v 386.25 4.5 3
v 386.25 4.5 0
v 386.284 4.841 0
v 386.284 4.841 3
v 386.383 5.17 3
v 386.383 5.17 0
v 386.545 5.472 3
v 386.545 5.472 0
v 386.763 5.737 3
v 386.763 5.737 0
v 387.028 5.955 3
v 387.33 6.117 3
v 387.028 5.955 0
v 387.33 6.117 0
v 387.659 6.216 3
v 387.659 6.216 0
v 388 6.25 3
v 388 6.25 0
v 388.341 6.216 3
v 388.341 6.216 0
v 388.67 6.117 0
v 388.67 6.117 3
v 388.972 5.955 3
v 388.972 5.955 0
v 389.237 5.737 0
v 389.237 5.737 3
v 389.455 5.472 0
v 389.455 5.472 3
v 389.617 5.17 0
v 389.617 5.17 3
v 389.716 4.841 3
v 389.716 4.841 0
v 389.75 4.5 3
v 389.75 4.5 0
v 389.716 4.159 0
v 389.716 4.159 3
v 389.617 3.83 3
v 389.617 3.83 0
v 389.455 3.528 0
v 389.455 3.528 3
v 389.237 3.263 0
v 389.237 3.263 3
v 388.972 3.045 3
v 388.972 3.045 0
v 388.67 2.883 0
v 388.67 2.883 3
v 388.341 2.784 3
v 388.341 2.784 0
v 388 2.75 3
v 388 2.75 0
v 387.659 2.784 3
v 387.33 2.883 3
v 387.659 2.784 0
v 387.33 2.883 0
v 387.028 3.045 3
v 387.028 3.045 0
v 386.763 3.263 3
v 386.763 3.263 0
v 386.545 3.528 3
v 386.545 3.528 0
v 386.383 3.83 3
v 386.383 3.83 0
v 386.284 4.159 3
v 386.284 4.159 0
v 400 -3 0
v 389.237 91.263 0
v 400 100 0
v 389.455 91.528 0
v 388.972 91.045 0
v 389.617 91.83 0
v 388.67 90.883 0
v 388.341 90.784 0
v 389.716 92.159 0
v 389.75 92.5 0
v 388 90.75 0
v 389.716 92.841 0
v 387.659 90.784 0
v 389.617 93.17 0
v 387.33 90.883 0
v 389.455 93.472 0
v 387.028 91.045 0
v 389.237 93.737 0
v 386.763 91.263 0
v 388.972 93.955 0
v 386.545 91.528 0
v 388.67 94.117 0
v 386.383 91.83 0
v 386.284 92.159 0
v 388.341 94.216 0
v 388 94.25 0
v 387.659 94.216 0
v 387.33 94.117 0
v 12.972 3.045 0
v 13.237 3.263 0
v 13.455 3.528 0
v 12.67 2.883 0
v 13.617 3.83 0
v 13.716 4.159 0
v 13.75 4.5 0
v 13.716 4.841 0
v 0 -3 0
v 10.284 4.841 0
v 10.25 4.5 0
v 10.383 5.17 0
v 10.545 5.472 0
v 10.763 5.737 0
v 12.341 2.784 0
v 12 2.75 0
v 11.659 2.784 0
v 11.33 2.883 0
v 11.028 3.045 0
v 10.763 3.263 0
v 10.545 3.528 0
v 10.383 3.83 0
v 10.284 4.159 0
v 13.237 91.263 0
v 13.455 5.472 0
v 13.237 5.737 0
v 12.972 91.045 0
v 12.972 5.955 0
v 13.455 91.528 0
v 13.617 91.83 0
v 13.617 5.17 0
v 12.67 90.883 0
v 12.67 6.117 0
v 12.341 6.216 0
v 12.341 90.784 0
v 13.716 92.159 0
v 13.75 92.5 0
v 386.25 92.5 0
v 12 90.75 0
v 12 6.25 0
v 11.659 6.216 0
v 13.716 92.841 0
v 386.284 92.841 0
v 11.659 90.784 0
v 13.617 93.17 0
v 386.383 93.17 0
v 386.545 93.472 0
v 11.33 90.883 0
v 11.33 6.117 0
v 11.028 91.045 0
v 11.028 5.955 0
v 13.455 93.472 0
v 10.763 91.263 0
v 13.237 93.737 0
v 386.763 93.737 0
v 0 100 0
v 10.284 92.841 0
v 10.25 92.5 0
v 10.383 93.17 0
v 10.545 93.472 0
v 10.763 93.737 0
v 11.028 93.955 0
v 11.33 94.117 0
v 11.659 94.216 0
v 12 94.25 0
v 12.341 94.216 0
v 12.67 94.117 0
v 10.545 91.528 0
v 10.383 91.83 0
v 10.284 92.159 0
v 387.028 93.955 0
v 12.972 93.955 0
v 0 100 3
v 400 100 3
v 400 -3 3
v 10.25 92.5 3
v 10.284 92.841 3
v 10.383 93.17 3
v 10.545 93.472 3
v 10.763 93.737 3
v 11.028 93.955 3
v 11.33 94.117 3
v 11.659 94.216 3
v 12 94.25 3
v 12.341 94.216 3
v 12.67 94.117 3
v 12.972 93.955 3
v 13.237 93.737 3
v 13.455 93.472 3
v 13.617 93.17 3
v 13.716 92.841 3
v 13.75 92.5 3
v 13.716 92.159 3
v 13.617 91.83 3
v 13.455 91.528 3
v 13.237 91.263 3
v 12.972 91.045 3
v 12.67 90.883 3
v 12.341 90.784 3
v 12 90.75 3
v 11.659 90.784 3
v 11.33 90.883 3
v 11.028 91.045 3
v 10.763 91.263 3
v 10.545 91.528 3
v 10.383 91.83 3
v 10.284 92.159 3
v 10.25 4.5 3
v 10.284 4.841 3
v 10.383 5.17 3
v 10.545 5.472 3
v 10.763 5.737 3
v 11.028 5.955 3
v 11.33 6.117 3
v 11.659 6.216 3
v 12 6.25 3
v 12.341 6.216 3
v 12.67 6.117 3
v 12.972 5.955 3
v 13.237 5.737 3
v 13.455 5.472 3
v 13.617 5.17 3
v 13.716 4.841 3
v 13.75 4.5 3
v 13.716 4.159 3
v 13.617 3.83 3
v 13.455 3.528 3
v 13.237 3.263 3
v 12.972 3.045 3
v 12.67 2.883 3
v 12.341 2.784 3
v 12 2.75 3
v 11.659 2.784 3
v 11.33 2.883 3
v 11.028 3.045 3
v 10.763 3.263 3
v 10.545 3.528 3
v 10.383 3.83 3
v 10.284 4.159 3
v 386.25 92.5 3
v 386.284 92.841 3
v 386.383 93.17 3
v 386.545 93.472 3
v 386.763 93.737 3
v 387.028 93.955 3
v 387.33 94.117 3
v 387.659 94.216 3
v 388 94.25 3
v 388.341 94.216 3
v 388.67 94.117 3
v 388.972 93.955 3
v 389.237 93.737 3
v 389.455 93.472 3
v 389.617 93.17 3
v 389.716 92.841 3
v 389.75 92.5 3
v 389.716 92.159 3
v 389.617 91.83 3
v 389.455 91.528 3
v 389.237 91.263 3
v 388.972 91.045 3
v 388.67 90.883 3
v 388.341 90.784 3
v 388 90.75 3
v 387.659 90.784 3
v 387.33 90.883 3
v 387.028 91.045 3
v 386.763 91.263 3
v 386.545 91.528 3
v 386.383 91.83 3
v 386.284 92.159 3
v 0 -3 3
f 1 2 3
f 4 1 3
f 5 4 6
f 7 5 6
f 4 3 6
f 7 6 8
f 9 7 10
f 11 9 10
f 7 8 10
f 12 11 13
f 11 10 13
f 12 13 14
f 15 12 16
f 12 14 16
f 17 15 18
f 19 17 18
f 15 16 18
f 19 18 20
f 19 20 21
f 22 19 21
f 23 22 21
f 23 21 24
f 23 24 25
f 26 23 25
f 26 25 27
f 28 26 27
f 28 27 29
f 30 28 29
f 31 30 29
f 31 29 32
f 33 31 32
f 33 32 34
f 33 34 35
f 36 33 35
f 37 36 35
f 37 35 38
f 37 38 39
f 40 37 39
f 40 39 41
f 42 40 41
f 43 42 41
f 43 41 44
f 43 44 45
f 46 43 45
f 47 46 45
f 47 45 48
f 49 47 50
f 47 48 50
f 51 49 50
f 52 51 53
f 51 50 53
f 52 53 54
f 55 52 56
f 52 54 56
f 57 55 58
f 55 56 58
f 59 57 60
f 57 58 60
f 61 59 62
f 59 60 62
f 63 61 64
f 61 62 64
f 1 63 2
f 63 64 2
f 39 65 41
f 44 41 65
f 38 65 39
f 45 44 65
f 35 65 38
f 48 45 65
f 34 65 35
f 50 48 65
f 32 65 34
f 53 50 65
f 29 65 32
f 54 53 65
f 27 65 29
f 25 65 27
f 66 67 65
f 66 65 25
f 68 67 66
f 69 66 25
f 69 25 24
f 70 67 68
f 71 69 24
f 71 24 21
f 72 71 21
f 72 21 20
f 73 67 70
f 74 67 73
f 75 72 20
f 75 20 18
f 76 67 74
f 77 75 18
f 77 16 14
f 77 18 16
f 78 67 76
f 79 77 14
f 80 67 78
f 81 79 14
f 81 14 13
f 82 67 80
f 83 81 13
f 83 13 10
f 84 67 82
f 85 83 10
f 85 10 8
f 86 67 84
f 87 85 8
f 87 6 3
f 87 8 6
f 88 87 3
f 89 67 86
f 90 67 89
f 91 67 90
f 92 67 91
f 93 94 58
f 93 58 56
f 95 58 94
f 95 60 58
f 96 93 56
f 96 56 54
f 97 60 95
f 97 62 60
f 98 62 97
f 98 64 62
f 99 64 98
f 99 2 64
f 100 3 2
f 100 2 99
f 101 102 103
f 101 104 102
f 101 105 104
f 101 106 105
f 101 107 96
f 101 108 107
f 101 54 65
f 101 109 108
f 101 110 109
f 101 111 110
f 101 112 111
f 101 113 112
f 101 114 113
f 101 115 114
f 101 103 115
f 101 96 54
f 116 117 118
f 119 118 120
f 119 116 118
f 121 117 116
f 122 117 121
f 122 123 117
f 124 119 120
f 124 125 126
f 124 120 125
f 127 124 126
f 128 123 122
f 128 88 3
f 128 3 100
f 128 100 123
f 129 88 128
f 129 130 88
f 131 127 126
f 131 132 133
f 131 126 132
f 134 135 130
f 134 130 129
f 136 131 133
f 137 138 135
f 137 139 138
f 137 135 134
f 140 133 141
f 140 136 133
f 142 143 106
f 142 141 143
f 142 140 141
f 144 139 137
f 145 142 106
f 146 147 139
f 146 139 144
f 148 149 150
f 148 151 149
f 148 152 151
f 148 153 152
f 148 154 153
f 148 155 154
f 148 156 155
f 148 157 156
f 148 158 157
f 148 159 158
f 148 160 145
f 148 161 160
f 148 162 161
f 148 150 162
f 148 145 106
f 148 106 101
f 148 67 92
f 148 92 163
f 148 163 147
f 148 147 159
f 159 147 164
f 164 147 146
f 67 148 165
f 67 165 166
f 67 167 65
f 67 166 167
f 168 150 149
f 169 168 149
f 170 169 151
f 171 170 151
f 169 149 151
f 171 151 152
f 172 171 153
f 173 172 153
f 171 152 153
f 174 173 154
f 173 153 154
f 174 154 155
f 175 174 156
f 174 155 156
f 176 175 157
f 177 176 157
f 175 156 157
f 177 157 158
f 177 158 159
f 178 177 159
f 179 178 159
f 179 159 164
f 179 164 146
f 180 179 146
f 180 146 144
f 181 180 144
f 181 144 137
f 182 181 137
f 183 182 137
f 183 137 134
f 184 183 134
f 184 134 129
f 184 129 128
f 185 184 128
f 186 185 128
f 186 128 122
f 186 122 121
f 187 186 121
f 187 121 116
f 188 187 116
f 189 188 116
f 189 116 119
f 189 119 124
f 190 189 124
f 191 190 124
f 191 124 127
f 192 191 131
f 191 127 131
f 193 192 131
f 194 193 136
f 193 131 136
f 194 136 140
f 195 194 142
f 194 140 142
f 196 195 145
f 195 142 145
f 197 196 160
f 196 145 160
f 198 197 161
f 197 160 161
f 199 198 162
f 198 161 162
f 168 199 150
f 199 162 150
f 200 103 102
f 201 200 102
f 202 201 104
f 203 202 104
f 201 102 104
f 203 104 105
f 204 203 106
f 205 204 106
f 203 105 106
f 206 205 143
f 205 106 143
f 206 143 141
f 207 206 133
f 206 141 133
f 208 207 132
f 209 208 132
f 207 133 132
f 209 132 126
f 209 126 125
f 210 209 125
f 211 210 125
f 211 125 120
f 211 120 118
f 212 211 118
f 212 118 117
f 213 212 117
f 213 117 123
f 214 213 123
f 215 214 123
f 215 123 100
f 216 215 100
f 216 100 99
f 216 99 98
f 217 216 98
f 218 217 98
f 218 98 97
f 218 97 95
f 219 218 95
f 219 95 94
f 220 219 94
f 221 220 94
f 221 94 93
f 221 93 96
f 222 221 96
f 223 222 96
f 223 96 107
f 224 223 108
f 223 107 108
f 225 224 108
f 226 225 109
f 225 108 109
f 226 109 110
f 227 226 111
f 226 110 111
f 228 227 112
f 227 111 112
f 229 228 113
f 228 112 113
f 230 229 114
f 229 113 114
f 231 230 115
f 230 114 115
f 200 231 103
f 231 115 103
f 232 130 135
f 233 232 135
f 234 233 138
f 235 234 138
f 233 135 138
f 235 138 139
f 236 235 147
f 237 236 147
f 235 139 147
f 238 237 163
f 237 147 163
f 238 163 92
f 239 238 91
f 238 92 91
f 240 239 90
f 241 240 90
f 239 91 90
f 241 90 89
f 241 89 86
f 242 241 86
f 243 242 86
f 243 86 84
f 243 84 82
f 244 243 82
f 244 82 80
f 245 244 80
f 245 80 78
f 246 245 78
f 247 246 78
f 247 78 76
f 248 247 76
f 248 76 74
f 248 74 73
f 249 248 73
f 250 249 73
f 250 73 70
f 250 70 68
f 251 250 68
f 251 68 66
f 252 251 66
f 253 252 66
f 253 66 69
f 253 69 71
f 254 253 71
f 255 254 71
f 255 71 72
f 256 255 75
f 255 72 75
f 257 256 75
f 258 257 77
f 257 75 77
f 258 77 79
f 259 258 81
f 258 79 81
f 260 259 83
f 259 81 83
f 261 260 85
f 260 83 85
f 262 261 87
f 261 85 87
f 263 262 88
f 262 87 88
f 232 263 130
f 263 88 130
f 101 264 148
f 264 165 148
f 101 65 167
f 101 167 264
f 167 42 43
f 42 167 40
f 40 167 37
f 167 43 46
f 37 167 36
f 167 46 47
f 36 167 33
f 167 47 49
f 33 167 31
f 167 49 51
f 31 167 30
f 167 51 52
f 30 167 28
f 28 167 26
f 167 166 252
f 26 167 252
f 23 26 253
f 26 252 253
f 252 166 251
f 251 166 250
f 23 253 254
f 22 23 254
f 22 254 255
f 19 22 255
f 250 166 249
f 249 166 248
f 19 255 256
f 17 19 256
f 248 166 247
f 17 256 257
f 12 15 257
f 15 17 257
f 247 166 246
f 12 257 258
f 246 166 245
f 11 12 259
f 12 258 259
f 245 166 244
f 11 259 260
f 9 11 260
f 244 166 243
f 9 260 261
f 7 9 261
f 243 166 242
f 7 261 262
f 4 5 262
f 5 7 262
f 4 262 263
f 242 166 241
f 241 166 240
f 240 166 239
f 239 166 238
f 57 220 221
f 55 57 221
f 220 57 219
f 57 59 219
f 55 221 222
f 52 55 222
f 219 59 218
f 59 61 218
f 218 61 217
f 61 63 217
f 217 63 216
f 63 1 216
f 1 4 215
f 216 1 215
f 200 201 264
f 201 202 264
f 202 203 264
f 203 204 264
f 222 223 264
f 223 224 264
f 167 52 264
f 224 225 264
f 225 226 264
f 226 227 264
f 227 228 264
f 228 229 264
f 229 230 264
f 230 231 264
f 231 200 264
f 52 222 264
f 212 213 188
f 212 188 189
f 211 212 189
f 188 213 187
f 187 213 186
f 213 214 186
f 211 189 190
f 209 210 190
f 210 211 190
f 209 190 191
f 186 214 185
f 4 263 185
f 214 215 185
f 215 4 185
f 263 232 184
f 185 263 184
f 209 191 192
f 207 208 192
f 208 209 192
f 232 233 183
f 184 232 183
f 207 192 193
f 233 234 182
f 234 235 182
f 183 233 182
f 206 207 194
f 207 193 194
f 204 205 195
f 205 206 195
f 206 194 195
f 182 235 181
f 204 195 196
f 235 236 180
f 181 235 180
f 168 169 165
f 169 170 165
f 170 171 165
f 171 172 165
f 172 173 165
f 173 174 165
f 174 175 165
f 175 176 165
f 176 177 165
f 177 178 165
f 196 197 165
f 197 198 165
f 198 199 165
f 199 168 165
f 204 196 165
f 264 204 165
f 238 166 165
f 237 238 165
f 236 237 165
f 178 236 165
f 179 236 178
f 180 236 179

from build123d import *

# Parameters (mm, degrees)
SKETCH1_W           = 400
SKETCH1_H           = 100
BOSS_EXTRUDE1_DEPTH = 3
SKETCH7_R           = 1.75
CUT_EXTRUDE6_DEPTH  = 4
SKETCH8_W           = 400
SKETCH8_H           = 3
BOSS_EXTRUDE2_DEPTH = 3


with BuildPart() as part:
    # Sketch1 → Boss-Extrude1 (new body)
    with BuildSketch(Plane.XY):
        with Locations((200, 50)):
            Rectangle(SKETCH1_W, SKETCH1_H)
    extrude(amount=BOSS_EXTRUDE1_DEPTH)

    # Sketch7 → Cut-Extrude6 (cut, through all)
    with BuildSketch(Plane(origin=(0, 0, 0), x_dir=(-1, 0, 0), z_dir=(0, 0, -1))):
        with Locations((-388, 92.5)):
            Circle(SKETCH7_R)
        with Locations((-388, 4.5)):
            Circle(SKETCH7_R)
        with Locations((-12, 92.5)):
            Circle(SKETCH7_R)
        with Locations((-12, 4.5)):
            Circle(SKETCH7_R)
    extrude(amount=-CUT_EXTRUDE6_DEPTH, mode=Mode.SUBTRACT)

    # Sketch8 → Boss-Extrude2 (add)
    with BuildSketch(Plane(origin=(0, 0, 0), x_dir=(-1, 0, 0), z_dir=(0, -1, 0))):
        with Locations((-200, -1.5)):
            Rectangle(SKETCH8_W, SKETCH8_H)
    extrude(amount=BOSS_EXTRUDE2_DEPTH)


solid = part.part
